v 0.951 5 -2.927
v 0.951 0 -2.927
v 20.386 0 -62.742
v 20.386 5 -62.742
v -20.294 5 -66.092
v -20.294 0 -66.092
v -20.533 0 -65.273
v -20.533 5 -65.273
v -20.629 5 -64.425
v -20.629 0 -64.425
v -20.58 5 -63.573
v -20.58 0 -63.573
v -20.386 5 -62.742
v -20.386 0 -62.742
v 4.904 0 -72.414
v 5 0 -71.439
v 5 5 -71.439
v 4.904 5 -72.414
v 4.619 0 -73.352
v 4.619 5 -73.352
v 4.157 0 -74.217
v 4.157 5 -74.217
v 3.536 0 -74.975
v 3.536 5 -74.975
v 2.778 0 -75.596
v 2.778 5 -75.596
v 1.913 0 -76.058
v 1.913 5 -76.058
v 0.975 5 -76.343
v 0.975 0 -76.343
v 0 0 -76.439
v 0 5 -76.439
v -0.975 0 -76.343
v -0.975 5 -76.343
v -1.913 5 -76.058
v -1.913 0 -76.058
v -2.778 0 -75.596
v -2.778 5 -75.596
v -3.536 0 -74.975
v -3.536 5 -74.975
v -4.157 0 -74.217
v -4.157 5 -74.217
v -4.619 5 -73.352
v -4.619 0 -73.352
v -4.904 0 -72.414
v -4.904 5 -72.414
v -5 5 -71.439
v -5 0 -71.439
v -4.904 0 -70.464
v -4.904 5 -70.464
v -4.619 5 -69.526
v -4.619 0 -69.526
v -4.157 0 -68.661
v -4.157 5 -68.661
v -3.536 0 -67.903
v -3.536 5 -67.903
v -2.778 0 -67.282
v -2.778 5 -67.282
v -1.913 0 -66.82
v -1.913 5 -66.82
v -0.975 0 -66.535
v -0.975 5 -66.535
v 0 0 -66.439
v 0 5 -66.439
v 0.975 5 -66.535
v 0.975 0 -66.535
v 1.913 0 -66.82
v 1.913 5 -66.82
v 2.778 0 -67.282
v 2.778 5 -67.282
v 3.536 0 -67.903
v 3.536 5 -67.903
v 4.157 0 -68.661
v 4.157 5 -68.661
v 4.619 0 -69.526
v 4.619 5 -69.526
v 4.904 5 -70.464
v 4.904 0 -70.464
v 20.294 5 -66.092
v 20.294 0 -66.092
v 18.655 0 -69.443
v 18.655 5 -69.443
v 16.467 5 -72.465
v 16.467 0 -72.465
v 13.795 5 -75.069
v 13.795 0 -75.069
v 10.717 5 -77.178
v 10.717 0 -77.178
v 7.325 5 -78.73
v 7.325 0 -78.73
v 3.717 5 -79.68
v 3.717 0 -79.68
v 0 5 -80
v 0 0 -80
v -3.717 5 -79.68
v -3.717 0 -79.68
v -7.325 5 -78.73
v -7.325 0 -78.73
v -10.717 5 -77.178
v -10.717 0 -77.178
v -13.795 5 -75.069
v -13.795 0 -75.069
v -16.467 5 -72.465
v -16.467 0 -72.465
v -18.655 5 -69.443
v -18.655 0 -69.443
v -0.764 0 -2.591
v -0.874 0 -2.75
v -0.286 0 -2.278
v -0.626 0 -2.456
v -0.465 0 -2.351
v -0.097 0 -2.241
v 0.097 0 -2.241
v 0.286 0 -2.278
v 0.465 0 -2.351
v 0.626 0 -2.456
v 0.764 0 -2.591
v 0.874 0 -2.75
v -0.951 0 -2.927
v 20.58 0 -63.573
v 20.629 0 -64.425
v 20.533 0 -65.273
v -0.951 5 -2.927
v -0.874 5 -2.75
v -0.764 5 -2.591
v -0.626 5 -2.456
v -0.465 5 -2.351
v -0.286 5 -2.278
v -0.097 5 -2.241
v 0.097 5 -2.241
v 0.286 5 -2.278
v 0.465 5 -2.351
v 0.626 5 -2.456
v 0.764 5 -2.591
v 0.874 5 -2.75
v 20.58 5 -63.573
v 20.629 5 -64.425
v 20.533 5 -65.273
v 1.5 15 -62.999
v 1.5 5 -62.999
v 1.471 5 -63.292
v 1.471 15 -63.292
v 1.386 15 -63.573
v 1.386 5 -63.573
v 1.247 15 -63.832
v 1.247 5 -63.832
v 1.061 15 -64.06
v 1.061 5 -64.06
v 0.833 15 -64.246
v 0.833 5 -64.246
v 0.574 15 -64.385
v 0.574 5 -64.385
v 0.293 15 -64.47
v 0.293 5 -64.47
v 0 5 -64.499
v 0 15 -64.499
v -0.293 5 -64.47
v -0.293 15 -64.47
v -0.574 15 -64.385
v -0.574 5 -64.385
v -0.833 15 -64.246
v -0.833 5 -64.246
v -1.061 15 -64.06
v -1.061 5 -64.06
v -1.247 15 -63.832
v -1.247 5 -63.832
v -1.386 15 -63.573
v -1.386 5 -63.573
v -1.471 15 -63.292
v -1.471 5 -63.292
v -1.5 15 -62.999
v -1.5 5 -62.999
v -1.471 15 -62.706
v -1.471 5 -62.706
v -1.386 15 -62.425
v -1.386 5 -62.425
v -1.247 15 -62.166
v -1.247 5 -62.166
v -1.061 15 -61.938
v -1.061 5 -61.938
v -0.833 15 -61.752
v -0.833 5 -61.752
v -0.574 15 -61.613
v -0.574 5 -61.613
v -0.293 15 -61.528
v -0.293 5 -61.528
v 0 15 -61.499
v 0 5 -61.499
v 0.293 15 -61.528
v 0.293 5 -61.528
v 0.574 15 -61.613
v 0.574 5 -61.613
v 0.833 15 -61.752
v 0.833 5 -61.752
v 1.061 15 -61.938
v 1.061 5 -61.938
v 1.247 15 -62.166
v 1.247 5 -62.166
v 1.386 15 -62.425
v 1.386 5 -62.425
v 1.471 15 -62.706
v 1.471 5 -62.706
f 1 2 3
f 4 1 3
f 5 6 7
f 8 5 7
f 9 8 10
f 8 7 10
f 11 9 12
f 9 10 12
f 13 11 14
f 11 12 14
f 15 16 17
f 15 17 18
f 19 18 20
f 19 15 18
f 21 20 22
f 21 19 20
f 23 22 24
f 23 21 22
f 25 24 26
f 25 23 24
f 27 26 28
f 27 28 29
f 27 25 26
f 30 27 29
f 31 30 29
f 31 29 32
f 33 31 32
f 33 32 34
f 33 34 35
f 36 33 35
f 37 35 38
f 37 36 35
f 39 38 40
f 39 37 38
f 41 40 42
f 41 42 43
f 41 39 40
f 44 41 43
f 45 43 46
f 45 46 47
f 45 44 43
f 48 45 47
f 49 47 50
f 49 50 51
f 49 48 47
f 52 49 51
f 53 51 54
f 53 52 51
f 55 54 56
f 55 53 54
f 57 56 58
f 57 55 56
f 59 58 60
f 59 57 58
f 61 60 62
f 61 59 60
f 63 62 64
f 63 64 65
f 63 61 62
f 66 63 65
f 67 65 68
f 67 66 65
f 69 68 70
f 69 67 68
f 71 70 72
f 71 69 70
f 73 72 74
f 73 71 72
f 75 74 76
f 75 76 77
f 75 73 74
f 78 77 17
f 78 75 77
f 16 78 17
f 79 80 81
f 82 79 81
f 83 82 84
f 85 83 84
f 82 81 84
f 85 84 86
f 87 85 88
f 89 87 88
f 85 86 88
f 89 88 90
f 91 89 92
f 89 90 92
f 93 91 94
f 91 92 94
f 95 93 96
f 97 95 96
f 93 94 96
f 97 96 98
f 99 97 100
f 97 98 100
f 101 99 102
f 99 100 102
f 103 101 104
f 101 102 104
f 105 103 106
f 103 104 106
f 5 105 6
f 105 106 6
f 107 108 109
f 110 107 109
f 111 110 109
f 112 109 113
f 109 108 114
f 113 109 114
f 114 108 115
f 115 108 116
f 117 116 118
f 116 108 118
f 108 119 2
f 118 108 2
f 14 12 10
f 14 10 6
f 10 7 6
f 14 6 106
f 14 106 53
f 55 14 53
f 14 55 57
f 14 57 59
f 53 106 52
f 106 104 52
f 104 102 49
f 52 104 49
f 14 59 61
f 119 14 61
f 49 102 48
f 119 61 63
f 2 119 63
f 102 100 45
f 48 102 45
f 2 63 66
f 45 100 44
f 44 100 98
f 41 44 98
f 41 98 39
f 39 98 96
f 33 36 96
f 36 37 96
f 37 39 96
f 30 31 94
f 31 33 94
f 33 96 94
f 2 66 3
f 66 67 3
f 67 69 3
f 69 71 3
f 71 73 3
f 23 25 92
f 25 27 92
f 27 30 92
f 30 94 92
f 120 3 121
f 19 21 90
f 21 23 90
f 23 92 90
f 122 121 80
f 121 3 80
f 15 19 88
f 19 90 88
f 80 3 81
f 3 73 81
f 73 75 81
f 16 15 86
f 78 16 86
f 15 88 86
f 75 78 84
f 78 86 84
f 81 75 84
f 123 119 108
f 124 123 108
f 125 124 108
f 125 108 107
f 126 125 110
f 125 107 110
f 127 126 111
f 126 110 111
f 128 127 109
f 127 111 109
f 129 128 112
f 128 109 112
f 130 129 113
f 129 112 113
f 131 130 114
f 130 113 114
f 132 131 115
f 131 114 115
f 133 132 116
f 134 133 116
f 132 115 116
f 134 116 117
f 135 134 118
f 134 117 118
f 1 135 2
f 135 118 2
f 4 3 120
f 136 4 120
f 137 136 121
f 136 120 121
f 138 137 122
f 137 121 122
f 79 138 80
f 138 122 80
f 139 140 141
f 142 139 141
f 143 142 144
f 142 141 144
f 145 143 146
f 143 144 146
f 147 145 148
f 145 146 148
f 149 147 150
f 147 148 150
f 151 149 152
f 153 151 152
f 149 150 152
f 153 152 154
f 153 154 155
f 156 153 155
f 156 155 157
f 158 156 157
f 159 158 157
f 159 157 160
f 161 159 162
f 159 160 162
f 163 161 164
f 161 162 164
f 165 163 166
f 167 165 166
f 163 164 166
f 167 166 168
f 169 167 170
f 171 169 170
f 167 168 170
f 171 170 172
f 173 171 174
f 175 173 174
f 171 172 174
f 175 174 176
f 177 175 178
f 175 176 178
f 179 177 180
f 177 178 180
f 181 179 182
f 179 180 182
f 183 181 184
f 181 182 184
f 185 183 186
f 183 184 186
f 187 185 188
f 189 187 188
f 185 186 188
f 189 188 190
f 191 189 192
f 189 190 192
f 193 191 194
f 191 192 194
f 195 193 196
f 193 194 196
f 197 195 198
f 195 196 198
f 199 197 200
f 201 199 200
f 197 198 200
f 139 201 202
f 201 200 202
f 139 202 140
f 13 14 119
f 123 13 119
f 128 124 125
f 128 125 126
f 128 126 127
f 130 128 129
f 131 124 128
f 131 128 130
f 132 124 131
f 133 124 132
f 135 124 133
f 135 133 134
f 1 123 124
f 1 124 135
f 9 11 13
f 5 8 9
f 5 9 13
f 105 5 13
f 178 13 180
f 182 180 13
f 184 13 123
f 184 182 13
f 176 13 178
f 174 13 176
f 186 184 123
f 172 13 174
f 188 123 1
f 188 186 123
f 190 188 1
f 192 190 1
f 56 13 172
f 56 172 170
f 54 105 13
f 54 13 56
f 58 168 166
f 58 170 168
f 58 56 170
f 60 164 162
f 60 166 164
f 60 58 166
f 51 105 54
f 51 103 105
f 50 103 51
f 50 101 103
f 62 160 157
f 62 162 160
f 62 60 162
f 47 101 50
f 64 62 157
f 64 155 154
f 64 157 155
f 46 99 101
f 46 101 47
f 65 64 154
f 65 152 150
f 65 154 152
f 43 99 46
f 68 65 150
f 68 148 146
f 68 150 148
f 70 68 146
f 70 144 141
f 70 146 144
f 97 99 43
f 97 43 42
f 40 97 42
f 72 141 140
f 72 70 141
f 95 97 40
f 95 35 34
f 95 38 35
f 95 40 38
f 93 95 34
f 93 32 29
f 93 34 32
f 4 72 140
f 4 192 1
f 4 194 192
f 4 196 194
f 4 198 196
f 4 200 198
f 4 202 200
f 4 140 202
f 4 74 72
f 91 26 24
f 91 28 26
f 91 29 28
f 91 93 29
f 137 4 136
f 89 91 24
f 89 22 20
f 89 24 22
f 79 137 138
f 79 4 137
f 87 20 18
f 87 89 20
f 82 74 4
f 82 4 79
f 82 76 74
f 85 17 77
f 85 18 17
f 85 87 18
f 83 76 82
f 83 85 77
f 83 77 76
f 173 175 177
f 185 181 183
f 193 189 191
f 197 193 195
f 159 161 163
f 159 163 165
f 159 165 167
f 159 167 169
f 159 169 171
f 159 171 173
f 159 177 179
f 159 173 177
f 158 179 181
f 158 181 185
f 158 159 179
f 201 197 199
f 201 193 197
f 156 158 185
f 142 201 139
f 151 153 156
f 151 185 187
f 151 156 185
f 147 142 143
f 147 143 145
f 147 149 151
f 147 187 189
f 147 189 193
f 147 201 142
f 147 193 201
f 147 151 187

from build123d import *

# Parameters (mm, degrees)
SKETCH4_R           = 5
BOSS_EXTRUDE1_DEPTH = 5
SKETCH7_R           = 1.5
BOSS_EXTRUDE2_DEPTH = 10


with BuildPart() as part:
    # Sketch4 → Boss-Extrude1 (new body)
    with BuildSketch(Plane(origin=(0, 0, 0), x_dir=(1, 0, 0), z_dir=(0, 1, 0))):
        with BuildLine():
            Line((0.951056516, 2.927050983), (20.386221797, 62.74233921))
            ThreePointArc((20.386221797, 62.74233921), (20.629049199, 64.42488908), (20.294107239, 66.091548341))
            ThreePointArc((20.294107239, 66.091548341), (0, 80), (-20.294107239, 66.091548341))
            ThreePointArc((-20.294107239, 66.091548341), (-20.629049199, 64.42488908), (-20.386221797, 62.74233921))
            Line((-20.386221797, 62.74233921), (-0.951056516, 2.927050983))
            ThreePointArc((-0.951056516, 2.927050983), (0, 2.236067977), (0.951056516, 2.927050983))
        make_face()
        with Locations((0, 71.439)):
            Circle(SKETCH4_R, mode=Mode.SUBTRACT)
    extrude(amount=BOSS_EXTRUDE1_DEPTH)

    # Sketch7 → Boss-Extrude2 (add)
    with BuildSketch(Plane(origin=(0, 5, 0), x_dir=(1, 0, 0), z_dir=(0, 1, 0))):
        with Locations((0, 62.999)):
            Circle(SKETCH7_R)
    extrude(amount=BOSS_EXTRUDE2_DEPTH)


solid = part.part
